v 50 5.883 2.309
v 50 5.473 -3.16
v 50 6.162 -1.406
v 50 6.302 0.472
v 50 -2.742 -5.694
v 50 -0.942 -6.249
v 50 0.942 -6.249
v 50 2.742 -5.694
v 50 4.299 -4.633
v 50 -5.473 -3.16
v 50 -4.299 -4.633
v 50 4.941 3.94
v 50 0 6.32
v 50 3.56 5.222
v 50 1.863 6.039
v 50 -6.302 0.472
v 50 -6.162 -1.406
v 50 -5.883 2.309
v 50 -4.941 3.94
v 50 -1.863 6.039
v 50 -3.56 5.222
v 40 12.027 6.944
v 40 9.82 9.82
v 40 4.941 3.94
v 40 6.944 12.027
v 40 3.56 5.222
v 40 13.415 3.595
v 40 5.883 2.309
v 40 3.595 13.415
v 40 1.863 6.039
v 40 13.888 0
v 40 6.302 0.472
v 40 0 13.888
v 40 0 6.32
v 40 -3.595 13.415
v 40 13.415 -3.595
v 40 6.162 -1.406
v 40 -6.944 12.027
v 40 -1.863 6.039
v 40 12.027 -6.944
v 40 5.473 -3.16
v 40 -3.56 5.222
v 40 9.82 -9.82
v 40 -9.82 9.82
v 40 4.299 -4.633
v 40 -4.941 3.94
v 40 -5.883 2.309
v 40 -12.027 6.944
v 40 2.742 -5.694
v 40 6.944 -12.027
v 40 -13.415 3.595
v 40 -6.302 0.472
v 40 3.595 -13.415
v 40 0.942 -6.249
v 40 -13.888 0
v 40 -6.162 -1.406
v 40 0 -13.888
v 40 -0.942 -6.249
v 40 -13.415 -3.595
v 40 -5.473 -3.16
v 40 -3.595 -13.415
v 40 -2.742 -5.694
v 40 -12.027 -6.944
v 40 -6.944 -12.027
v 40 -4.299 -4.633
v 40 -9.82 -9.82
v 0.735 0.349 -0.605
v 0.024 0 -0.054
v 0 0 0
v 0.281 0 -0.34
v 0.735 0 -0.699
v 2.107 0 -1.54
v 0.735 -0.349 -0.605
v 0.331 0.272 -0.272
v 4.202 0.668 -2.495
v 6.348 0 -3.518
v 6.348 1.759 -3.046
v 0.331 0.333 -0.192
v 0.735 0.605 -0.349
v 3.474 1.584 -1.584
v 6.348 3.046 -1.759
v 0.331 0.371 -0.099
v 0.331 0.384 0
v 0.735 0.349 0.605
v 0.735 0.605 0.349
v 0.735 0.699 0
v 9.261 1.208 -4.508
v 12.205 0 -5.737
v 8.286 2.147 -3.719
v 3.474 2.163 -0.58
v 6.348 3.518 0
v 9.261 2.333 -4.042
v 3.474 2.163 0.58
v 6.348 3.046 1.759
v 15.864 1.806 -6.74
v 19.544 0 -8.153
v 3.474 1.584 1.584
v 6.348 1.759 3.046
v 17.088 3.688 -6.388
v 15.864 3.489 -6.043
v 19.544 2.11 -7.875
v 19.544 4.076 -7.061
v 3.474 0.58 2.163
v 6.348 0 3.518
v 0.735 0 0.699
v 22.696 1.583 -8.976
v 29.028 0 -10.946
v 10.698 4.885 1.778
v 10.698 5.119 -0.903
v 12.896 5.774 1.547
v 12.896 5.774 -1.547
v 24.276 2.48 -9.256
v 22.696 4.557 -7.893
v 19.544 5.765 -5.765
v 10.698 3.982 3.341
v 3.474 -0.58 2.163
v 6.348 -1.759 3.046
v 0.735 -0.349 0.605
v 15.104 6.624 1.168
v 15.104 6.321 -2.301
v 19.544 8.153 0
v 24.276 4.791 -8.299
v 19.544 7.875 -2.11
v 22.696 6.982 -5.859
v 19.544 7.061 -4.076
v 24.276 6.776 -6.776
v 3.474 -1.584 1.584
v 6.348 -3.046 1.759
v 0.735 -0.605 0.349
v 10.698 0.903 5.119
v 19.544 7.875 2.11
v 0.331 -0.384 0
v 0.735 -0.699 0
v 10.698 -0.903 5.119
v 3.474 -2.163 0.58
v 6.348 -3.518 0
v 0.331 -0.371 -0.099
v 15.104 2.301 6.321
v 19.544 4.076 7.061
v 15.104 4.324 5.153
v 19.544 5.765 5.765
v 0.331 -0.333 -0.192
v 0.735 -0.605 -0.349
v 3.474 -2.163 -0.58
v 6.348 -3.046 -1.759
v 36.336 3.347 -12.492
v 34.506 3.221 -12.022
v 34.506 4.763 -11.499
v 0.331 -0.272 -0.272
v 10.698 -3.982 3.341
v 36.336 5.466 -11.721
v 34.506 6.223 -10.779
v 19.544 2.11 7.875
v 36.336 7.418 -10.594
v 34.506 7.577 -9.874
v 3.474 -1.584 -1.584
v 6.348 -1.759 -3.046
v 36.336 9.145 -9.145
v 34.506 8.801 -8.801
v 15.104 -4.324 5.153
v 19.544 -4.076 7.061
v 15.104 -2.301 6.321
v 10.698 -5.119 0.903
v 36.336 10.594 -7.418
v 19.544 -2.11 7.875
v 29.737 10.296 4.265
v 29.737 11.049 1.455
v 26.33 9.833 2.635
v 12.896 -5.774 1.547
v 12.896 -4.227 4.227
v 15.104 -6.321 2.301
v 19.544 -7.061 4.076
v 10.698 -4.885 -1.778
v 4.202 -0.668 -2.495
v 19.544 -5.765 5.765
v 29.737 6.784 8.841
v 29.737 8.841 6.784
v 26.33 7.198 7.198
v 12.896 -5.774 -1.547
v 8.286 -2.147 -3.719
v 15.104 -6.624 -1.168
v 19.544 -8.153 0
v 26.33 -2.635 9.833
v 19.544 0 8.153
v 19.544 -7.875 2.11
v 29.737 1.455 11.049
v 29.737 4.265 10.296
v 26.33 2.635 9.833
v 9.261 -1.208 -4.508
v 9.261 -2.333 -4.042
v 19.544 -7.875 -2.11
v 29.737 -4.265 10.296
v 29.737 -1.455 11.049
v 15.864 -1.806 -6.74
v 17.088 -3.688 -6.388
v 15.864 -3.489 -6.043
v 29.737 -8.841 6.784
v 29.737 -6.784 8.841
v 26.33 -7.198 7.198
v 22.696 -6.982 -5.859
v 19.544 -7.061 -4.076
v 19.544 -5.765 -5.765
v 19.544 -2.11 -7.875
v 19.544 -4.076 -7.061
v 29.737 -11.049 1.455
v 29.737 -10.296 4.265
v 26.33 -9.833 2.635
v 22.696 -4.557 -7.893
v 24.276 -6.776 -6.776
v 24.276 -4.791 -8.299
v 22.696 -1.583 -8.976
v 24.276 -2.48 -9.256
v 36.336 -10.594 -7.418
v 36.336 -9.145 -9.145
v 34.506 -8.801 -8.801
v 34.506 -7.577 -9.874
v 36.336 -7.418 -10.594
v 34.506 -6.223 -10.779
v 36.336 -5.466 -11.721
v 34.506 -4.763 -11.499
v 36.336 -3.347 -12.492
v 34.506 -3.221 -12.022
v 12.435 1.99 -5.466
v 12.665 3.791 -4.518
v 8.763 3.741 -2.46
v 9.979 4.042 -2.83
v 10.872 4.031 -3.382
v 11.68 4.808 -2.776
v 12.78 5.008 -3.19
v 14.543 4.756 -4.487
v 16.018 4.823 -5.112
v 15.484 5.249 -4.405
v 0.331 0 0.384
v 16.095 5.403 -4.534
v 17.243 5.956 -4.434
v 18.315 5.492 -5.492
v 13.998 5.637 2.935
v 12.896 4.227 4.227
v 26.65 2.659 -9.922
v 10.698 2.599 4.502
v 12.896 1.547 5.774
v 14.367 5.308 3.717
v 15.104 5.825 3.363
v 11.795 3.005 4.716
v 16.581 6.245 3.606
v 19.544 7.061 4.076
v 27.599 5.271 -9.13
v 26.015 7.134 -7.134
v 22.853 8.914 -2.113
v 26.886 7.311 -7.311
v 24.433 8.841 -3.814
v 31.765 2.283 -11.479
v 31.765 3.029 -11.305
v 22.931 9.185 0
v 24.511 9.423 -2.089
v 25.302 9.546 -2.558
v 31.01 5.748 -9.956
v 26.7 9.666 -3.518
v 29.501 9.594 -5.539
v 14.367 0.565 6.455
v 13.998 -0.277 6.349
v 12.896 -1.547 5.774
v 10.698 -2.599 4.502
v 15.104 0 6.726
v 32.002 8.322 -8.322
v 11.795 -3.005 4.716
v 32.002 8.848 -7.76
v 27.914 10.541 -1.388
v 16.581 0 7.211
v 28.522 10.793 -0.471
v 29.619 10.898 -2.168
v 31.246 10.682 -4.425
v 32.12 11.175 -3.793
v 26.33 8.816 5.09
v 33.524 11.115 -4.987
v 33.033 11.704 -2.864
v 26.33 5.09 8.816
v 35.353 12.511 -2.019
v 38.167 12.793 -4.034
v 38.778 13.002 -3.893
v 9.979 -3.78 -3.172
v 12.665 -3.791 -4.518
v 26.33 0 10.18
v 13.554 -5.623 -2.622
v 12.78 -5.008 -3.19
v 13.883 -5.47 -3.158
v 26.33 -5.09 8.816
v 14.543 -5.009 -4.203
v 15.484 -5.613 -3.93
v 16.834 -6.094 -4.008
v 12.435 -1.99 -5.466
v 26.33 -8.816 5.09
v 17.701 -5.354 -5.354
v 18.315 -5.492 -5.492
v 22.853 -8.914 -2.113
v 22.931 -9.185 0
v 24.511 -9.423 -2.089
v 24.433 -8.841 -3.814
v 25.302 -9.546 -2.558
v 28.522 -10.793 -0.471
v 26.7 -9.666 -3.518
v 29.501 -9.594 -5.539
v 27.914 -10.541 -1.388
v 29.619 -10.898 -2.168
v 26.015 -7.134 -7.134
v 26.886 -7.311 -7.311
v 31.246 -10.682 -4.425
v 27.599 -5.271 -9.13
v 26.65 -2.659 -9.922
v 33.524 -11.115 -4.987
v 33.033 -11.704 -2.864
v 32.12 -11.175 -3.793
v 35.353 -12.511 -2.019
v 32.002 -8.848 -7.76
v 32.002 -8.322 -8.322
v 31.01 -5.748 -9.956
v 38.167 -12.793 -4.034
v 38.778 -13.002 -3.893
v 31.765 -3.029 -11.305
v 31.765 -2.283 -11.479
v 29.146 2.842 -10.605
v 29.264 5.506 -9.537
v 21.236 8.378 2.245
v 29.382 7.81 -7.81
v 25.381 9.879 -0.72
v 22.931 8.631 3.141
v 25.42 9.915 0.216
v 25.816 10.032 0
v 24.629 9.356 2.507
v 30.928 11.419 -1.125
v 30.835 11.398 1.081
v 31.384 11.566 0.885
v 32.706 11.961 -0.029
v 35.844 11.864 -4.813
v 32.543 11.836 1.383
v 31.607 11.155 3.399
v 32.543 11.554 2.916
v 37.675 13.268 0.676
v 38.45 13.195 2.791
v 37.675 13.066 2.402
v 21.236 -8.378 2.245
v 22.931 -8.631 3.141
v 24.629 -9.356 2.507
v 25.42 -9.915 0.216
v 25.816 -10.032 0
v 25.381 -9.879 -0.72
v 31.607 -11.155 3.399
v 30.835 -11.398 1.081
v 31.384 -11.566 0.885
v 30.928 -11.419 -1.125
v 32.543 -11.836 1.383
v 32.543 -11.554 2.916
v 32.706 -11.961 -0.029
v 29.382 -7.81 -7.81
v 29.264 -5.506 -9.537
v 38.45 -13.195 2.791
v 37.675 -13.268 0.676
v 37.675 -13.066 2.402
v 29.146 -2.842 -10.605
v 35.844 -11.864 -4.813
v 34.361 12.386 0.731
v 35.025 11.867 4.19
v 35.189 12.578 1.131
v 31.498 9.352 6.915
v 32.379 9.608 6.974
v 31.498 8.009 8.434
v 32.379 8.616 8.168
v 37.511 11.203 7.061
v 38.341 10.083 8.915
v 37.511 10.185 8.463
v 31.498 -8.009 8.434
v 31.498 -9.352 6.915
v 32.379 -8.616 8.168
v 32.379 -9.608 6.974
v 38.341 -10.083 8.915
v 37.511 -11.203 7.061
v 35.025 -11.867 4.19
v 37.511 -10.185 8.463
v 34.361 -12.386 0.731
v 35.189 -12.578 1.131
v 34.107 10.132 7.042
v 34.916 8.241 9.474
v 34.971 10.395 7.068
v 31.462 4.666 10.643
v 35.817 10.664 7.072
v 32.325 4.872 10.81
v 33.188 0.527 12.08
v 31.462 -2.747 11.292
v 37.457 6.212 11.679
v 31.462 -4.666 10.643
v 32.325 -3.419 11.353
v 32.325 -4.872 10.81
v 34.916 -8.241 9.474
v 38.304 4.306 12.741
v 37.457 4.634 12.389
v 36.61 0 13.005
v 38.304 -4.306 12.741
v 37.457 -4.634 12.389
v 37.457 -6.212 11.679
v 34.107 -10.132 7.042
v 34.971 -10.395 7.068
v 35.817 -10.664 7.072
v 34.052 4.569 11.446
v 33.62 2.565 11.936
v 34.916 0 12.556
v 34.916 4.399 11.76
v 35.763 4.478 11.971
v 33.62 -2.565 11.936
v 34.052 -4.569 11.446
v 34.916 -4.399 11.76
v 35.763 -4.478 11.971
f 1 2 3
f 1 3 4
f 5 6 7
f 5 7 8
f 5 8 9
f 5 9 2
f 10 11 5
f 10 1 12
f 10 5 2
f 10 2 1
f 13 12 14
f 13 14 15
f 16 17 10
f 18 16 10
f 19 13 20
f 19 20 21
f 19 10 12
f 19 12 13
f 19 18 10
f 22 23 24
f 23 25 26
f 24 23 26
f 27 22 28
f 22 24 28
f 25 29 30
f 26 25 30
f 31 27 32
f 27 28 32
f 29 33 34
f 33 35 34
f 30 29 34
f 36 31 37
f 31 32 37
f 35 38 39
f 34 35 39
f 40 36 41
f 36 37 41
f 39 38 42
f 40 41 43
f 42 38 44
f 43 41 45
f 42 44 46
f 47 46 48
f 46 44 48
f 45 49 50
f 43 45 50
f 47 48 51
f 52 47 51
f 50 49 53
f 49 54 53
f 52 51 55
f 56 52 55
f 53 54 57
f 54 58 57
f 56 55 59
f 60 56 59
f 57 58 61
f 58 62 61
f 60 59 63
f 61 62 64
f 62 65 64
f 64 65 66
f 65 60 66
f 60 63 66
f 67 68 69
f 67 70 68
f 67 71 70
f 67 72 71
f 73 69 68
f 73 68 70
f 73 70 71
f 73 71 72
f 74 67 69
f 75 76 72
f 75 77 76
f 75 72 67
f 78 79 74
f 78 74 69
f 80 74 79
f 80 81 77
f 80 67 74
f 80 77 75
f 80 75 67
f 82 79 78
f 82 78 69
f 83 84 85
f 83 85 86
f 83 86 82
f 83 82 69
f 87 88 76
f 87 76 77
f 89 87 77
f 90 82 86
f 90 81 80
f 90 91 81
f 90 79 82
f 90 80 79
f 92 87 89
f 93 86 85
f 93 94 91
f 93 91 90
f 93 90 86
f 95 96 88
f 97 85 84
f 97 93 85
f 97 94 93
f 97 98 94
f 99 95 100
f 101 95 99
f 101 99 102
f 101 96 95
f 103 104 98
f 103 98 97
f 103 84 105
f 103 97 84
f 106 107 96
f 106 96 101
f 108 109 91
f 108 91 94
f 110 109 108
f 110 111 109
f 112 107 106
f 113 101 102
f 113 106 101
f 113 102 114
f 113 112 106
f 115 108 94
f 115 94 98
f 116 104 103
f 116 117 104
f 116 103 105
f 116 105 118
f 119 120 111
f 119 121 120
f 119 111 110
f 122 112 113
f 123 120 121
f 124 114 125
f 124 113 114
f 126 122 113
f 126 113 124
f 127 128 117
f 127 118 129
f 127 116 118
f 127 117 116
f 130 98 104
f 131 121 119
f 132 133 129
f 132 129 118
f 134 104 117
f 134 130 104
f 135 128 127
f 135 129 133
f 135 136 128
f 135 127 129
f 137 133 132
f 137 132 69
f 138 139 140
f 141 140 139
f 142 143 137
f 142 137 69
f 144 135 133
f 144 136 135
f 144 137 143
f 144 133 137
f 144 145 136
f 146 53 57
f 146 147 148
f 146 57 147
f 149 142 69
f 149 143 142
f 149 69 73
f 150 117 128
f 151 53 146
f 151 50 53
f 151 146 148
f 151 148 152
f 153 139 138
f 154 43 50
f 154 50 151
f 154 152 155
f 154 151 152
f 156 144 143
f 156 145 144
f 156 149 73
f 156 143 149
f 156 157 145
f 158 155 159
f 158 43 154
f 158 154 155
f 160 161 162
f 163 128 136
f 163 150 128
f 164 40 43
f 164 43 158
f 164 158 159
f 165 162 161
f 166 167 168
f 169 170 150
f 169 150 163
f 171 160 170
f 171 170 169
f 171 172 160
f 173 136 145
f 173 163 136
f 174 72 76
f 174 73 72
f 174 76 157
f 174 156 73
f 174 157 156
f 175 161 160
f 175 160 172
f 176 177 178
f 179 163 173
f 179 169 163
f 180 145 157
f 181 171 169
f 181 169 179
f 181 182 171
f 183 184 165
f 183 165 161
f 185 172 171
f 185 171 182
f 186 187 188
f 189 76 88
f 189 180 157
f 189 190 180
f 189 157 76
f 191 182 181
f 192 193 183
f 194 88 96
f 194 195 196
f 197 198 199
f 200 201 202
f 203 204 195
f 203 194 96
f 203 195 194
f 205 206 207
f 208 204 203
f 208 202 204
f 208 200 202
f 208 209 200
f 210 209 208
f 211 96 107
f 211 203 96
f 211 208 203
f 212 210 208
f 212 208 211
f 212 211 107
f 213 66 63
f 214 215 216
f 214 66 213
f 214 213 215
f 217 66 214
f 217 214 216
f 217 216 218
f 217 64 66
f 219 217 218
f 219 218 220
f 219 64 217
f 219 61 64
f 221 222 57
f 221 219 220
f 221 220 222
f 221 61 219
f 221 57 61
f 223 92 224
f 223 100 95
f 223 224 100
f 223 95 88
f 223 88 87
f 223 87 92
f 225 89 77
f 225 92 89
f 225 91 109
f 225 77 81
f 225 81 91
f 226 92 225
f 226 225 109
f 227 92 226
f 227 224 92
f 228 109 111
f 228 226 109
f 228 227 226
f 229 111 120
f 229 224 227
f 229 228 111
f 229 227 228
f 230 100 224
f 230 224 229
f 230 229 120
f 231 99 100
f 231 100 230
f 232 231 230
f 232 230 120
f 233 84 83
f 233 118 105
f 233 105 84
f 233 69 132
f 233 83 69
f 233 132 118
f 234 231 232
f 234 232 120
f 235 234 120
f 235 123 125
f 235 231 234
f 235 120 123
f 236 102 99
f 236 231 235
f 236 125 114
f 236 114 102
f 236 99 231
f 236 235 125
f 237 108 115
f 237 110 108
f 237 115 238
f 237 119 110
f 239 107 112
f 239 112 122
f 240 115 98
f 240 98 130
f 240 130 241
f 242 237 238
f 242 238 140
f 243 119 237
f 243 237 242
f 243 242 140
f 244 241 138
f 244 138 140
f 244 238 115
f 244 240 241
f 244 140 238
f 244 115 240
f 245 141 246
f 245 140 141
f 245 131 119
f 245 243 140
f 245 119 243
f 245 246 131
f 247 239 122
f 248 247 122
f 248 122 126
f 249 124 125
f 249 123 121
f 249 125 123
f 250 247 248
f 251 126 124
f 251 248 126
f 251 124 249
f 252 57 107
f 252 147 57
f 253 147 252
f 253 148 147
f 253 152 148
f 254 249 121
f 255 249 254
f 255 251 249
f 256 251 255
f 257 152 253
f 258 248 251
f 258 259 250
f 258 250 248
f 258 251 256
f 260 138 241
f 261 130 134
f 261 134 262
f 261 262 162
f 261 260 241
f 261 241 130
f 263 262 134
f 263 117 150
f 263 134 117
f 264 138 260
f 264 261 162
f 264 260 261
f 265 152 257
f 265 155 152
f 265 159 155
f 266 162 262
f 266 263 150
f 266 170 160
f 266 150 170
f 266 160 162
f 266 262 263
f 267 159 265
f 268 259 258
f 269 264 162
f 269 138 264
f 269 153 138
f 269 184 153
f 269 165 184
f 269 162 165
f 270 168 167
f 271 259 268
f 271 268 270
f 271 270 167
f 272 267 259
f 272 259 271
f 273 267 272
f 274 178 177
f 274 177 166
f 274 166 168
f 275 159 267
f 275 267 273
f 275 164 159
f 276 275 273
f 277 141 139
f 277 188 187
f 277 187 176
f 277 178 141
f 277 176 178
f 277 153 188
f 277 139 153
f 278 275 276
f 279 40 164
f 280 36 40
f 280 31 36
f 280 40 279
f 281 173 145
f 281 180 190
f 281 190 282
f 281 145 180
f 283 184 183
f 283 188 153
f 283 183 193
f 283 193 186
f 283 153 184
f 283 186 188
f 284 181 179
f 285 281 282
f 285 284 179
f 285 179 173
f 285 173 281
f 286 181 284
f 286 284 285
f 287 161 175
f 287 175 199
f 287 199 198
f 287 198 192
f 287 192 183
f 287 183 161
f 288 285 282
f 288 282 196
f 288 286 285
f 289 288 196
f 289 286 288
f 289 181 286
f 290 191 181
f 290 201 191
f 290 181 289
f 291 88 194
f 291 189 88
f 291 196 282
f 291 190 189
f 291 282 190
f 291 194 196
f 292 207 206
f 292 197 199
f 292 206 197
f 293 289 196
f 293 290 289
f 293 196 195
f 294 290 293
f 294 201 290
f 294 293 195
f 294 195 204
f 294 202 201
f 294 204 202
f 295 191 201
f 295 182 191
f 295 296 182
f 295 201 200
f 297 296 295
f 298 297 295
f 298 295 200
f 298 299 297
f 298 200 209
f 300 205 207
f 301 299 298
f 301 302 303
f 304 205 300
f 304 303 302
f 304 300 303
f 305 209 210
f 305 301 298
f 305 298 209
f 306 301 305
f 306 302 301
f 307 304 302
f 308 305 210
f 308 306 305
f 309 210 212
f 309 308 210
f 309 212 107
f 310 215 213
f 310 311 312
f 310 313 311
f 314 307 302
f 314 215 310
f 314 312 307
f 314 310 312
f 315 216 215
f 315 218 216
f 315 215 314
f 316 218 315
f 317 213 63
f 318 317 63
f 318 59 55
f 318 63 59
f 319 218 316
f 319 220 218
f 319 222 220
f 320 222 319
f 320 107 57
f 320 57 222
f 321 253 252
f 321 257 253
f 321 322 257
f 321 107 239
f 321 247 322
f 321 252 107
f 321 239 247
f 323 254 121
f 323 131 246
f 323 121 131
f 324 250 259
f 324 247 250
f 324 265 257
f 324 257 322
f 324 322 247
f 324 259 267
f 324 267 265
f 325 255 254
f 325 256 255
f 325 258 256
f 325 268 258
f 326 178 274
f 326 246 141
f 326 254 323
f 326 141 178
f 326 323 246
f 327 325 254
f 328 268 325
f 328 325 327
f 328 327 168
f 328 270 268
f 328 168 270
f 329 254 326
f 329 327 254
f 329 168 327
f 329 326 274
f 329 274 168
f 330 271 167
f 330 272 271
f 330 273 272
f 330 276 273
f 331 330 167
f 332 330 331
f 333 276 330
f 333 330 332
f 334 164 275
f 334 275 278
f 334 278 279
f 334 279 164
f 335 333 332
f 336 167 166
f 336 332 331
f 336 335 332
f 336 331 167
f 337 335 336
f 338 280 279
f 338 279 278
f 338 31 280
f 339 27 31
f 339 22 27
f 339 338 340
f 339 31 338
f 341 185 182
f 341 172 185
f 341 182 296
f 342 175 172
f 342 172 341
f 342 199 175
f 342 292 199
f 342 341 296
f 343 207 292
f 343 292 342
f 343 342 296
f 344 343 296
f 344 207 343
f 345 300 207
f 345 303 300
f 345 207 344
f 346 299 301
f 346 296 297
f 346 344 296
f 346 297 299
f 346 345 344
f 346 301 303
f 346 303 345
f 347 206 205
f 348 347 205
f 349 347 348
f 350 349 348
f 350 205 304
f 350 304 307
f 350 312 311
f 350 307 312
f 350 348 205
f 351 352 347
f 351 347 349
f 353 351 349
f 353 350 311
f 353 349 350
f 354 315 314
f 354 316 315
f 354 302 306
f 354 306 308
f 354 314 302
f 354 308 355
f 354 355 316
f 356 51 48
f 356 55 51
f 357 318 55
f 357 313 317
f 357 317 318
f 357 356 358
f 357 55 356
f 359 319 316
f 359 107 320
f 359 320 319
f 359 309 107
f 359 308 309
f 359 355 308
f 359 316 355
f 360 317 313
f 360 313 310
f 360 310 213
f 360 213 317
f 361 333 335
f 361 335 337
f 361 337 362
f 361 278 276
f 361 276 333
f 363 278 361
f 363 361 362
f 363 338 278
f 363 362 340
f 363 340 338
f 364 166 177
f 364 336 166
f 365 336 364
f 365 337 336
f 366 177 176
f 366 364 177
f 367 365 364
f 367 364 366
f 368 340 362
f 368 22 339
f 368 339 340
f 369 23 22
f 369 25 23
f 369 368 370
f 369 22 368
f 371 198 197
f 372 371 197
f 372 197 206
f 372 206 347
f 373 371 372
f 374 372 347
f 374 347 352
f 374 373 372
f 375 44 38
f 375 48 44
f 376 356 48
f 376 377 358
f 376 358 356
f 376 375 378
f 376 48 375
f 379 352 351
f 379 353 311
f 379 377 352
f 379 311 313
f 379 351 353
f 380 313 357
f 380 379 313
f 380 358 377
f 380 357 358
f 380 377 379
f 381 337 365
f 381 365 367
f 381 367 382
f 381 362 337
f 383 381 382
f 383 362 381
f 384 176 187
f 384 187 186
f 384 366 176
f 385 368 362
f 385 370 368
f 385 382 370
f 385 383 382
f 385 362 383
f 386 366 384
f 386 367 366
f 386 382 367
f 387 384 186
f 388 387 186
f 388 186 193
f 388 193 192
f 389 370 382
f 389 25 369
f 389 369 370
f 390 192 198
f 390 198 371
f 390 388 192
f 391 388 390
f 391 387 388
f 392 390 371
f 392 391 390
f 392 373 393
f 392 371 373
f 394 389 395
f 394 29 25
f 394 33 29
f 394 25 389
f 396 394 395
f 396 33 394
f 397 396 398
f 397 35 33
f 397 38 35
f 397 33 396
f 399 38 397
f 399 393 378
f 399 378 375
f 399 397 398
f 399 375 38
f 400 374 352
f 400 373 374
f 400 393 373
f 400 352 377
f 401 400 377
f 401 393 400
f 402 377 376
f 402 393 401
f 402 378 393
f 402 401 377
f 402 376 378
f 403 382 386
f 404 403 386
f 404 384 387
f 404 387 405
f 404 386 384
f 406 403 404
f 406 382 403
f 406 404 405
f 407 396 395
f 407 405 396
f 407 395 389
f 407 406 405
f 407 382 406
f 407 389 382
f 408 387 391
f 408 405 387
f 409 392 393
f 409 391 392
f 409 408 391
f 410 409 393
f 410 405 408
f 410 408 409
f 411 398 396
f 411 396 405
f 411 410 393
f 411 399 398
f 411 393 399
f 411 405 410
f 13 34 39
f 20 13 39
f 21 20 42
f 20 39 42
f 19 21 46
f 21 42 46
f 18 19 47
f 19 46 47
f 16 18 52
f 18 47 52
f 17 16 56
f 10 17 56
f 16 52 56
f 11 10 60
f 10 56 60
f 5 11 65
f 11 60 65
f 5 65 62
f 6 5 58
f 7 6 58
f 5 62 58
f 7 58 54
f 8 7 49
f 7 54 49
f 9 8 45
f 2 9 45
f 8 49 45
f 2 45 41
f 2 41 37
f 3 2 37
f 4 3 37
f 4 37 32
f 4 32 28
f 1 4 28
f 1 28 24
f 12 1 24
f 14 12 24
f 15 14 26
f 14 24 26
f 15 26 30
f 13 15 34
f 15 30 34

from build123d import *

# Parameters (mm, degrees)
SKETCH5_W           = 40
SKETCH5_H           = 13.888133248
SKETCH6_R           = 6.32
BOSS_EXTRUDE1_DEPTH = 10


with BuildPart() as part:
    # Sketch4 → Revolve3 (revolve)
    with BuildSketch(Plane(origin=(0, 0, 0), x_dir=(1, 0, 0), z_dir=(0, 1, 0))):
        with BuildLine():
            Line((0, 0), (700, 0))
            Line((700, 0), (700, 92))
            add(Edge.make_bspline(
                [(0, 0), (0.00191147, 0.007452455), (0.006682771, 0.021975667), (0.020319911, 0.049405272), (0.053712312, 0.100813891), (0.106292543, 0.166564672), (0.179361524, 0.244890293), (0.321314168, 0.380305786), (0.489821471, 0.519272356), (0.682008296, 0.663619163), (0.97824001, 0.869271861), (1.381516871, 1.128290995), (2.087665161, 1.540864263), (3.352844681, 2.20038034), (5.559362022, 3.217605874), (9.551431072, 4.830778204), (16.8107271, 7.377330859), (28.917425512, 11.039410523), (45.357311817, 15.359469167), (65.219754515, 20.019307373), (92.239595195, 25.797411612), (124.65879636, 32.080212127), (162.600367905, 38.763077948), (206.074460711, 45.728609064), (249.632824355, 52.143059314), (293.258988419, 58.07761177), (336.942021596, 63.576842057), (380.674593437, 68.666747534), (424.45146039, 73.360146302), (468.268944021, 77.658075094), (512.124428867, 81.549646326), (556.016196354, 85.009603585), (594.452384, 87.618355269), (627.419605801, 89.502855515), (653.668023827, 90.726417336), (671.057263835, 91.380719564), (685.081182637, 91.780411211), (693.605741334, 91.941702123), (697.868499327, 91.993335353), (700, 92)],
                knots=[0, 0, 0, 0, 0, 4.3185e-05, 8.637e-05, 0.000172741, 0.000345481, 0.000518222, 0.000690962, 0.001280476, 0.001578086, 0.001875696, 0.002727788, 0.00398729, 0.006196413, 0.009932334, 0.016447975, 0.028301339, 0.049639657, 0.081363194, 0.112451539, 0.143539883, 0.205716599, 0.267893307, 0.330070016, 0.392246725, 0.454423434, 0.516600142, 0.578776854, 0.640953563, 0.703130272, 0.765306983, 0.827483692, 0.889660402, 0.920748757, 0.951837113, 0.975918556, 0.987959278, 1, 1, 1, 1, 1], degree=4))
        make_face()
    revolve(axis=Axis((0, 0, 0), (1, 0, 0)))


with BuildPart() as body_2:
    # Sketch5 → Revolve5 (revolve)
    with BuildSketch(Plane.XY, mode=Mode.PRIVATE) as revolve5_sk:
        with Locations((20, 6.944066624)):
            Rectangle(SKETCH5_W, SKETCH5_H)
    revolve(revolve5_sk.sketch.rotate(Axis((0, 0, 0), (1, 0, 0)), 90), axis=Axis((0, 0, 0), (1, 0, 0)))

    # Combine1: intersect part
    add(part.part, mode=Mode.INTERSECT)

    # Sketch6 → Boss-Extrude1 (add)
    with BuildSketch(Plane(origin=(40, 0, 0), x_dir=(0, 0, -1), z_dir=(1, 0, 0))):
        with Locations(Location((0, 0, 0), (0, 0, 180))):
            Circle(SKETCH6_R)
    extrude(amount=BOSS_EXTRUDE1_DEPTH)


solid = body_2.part
